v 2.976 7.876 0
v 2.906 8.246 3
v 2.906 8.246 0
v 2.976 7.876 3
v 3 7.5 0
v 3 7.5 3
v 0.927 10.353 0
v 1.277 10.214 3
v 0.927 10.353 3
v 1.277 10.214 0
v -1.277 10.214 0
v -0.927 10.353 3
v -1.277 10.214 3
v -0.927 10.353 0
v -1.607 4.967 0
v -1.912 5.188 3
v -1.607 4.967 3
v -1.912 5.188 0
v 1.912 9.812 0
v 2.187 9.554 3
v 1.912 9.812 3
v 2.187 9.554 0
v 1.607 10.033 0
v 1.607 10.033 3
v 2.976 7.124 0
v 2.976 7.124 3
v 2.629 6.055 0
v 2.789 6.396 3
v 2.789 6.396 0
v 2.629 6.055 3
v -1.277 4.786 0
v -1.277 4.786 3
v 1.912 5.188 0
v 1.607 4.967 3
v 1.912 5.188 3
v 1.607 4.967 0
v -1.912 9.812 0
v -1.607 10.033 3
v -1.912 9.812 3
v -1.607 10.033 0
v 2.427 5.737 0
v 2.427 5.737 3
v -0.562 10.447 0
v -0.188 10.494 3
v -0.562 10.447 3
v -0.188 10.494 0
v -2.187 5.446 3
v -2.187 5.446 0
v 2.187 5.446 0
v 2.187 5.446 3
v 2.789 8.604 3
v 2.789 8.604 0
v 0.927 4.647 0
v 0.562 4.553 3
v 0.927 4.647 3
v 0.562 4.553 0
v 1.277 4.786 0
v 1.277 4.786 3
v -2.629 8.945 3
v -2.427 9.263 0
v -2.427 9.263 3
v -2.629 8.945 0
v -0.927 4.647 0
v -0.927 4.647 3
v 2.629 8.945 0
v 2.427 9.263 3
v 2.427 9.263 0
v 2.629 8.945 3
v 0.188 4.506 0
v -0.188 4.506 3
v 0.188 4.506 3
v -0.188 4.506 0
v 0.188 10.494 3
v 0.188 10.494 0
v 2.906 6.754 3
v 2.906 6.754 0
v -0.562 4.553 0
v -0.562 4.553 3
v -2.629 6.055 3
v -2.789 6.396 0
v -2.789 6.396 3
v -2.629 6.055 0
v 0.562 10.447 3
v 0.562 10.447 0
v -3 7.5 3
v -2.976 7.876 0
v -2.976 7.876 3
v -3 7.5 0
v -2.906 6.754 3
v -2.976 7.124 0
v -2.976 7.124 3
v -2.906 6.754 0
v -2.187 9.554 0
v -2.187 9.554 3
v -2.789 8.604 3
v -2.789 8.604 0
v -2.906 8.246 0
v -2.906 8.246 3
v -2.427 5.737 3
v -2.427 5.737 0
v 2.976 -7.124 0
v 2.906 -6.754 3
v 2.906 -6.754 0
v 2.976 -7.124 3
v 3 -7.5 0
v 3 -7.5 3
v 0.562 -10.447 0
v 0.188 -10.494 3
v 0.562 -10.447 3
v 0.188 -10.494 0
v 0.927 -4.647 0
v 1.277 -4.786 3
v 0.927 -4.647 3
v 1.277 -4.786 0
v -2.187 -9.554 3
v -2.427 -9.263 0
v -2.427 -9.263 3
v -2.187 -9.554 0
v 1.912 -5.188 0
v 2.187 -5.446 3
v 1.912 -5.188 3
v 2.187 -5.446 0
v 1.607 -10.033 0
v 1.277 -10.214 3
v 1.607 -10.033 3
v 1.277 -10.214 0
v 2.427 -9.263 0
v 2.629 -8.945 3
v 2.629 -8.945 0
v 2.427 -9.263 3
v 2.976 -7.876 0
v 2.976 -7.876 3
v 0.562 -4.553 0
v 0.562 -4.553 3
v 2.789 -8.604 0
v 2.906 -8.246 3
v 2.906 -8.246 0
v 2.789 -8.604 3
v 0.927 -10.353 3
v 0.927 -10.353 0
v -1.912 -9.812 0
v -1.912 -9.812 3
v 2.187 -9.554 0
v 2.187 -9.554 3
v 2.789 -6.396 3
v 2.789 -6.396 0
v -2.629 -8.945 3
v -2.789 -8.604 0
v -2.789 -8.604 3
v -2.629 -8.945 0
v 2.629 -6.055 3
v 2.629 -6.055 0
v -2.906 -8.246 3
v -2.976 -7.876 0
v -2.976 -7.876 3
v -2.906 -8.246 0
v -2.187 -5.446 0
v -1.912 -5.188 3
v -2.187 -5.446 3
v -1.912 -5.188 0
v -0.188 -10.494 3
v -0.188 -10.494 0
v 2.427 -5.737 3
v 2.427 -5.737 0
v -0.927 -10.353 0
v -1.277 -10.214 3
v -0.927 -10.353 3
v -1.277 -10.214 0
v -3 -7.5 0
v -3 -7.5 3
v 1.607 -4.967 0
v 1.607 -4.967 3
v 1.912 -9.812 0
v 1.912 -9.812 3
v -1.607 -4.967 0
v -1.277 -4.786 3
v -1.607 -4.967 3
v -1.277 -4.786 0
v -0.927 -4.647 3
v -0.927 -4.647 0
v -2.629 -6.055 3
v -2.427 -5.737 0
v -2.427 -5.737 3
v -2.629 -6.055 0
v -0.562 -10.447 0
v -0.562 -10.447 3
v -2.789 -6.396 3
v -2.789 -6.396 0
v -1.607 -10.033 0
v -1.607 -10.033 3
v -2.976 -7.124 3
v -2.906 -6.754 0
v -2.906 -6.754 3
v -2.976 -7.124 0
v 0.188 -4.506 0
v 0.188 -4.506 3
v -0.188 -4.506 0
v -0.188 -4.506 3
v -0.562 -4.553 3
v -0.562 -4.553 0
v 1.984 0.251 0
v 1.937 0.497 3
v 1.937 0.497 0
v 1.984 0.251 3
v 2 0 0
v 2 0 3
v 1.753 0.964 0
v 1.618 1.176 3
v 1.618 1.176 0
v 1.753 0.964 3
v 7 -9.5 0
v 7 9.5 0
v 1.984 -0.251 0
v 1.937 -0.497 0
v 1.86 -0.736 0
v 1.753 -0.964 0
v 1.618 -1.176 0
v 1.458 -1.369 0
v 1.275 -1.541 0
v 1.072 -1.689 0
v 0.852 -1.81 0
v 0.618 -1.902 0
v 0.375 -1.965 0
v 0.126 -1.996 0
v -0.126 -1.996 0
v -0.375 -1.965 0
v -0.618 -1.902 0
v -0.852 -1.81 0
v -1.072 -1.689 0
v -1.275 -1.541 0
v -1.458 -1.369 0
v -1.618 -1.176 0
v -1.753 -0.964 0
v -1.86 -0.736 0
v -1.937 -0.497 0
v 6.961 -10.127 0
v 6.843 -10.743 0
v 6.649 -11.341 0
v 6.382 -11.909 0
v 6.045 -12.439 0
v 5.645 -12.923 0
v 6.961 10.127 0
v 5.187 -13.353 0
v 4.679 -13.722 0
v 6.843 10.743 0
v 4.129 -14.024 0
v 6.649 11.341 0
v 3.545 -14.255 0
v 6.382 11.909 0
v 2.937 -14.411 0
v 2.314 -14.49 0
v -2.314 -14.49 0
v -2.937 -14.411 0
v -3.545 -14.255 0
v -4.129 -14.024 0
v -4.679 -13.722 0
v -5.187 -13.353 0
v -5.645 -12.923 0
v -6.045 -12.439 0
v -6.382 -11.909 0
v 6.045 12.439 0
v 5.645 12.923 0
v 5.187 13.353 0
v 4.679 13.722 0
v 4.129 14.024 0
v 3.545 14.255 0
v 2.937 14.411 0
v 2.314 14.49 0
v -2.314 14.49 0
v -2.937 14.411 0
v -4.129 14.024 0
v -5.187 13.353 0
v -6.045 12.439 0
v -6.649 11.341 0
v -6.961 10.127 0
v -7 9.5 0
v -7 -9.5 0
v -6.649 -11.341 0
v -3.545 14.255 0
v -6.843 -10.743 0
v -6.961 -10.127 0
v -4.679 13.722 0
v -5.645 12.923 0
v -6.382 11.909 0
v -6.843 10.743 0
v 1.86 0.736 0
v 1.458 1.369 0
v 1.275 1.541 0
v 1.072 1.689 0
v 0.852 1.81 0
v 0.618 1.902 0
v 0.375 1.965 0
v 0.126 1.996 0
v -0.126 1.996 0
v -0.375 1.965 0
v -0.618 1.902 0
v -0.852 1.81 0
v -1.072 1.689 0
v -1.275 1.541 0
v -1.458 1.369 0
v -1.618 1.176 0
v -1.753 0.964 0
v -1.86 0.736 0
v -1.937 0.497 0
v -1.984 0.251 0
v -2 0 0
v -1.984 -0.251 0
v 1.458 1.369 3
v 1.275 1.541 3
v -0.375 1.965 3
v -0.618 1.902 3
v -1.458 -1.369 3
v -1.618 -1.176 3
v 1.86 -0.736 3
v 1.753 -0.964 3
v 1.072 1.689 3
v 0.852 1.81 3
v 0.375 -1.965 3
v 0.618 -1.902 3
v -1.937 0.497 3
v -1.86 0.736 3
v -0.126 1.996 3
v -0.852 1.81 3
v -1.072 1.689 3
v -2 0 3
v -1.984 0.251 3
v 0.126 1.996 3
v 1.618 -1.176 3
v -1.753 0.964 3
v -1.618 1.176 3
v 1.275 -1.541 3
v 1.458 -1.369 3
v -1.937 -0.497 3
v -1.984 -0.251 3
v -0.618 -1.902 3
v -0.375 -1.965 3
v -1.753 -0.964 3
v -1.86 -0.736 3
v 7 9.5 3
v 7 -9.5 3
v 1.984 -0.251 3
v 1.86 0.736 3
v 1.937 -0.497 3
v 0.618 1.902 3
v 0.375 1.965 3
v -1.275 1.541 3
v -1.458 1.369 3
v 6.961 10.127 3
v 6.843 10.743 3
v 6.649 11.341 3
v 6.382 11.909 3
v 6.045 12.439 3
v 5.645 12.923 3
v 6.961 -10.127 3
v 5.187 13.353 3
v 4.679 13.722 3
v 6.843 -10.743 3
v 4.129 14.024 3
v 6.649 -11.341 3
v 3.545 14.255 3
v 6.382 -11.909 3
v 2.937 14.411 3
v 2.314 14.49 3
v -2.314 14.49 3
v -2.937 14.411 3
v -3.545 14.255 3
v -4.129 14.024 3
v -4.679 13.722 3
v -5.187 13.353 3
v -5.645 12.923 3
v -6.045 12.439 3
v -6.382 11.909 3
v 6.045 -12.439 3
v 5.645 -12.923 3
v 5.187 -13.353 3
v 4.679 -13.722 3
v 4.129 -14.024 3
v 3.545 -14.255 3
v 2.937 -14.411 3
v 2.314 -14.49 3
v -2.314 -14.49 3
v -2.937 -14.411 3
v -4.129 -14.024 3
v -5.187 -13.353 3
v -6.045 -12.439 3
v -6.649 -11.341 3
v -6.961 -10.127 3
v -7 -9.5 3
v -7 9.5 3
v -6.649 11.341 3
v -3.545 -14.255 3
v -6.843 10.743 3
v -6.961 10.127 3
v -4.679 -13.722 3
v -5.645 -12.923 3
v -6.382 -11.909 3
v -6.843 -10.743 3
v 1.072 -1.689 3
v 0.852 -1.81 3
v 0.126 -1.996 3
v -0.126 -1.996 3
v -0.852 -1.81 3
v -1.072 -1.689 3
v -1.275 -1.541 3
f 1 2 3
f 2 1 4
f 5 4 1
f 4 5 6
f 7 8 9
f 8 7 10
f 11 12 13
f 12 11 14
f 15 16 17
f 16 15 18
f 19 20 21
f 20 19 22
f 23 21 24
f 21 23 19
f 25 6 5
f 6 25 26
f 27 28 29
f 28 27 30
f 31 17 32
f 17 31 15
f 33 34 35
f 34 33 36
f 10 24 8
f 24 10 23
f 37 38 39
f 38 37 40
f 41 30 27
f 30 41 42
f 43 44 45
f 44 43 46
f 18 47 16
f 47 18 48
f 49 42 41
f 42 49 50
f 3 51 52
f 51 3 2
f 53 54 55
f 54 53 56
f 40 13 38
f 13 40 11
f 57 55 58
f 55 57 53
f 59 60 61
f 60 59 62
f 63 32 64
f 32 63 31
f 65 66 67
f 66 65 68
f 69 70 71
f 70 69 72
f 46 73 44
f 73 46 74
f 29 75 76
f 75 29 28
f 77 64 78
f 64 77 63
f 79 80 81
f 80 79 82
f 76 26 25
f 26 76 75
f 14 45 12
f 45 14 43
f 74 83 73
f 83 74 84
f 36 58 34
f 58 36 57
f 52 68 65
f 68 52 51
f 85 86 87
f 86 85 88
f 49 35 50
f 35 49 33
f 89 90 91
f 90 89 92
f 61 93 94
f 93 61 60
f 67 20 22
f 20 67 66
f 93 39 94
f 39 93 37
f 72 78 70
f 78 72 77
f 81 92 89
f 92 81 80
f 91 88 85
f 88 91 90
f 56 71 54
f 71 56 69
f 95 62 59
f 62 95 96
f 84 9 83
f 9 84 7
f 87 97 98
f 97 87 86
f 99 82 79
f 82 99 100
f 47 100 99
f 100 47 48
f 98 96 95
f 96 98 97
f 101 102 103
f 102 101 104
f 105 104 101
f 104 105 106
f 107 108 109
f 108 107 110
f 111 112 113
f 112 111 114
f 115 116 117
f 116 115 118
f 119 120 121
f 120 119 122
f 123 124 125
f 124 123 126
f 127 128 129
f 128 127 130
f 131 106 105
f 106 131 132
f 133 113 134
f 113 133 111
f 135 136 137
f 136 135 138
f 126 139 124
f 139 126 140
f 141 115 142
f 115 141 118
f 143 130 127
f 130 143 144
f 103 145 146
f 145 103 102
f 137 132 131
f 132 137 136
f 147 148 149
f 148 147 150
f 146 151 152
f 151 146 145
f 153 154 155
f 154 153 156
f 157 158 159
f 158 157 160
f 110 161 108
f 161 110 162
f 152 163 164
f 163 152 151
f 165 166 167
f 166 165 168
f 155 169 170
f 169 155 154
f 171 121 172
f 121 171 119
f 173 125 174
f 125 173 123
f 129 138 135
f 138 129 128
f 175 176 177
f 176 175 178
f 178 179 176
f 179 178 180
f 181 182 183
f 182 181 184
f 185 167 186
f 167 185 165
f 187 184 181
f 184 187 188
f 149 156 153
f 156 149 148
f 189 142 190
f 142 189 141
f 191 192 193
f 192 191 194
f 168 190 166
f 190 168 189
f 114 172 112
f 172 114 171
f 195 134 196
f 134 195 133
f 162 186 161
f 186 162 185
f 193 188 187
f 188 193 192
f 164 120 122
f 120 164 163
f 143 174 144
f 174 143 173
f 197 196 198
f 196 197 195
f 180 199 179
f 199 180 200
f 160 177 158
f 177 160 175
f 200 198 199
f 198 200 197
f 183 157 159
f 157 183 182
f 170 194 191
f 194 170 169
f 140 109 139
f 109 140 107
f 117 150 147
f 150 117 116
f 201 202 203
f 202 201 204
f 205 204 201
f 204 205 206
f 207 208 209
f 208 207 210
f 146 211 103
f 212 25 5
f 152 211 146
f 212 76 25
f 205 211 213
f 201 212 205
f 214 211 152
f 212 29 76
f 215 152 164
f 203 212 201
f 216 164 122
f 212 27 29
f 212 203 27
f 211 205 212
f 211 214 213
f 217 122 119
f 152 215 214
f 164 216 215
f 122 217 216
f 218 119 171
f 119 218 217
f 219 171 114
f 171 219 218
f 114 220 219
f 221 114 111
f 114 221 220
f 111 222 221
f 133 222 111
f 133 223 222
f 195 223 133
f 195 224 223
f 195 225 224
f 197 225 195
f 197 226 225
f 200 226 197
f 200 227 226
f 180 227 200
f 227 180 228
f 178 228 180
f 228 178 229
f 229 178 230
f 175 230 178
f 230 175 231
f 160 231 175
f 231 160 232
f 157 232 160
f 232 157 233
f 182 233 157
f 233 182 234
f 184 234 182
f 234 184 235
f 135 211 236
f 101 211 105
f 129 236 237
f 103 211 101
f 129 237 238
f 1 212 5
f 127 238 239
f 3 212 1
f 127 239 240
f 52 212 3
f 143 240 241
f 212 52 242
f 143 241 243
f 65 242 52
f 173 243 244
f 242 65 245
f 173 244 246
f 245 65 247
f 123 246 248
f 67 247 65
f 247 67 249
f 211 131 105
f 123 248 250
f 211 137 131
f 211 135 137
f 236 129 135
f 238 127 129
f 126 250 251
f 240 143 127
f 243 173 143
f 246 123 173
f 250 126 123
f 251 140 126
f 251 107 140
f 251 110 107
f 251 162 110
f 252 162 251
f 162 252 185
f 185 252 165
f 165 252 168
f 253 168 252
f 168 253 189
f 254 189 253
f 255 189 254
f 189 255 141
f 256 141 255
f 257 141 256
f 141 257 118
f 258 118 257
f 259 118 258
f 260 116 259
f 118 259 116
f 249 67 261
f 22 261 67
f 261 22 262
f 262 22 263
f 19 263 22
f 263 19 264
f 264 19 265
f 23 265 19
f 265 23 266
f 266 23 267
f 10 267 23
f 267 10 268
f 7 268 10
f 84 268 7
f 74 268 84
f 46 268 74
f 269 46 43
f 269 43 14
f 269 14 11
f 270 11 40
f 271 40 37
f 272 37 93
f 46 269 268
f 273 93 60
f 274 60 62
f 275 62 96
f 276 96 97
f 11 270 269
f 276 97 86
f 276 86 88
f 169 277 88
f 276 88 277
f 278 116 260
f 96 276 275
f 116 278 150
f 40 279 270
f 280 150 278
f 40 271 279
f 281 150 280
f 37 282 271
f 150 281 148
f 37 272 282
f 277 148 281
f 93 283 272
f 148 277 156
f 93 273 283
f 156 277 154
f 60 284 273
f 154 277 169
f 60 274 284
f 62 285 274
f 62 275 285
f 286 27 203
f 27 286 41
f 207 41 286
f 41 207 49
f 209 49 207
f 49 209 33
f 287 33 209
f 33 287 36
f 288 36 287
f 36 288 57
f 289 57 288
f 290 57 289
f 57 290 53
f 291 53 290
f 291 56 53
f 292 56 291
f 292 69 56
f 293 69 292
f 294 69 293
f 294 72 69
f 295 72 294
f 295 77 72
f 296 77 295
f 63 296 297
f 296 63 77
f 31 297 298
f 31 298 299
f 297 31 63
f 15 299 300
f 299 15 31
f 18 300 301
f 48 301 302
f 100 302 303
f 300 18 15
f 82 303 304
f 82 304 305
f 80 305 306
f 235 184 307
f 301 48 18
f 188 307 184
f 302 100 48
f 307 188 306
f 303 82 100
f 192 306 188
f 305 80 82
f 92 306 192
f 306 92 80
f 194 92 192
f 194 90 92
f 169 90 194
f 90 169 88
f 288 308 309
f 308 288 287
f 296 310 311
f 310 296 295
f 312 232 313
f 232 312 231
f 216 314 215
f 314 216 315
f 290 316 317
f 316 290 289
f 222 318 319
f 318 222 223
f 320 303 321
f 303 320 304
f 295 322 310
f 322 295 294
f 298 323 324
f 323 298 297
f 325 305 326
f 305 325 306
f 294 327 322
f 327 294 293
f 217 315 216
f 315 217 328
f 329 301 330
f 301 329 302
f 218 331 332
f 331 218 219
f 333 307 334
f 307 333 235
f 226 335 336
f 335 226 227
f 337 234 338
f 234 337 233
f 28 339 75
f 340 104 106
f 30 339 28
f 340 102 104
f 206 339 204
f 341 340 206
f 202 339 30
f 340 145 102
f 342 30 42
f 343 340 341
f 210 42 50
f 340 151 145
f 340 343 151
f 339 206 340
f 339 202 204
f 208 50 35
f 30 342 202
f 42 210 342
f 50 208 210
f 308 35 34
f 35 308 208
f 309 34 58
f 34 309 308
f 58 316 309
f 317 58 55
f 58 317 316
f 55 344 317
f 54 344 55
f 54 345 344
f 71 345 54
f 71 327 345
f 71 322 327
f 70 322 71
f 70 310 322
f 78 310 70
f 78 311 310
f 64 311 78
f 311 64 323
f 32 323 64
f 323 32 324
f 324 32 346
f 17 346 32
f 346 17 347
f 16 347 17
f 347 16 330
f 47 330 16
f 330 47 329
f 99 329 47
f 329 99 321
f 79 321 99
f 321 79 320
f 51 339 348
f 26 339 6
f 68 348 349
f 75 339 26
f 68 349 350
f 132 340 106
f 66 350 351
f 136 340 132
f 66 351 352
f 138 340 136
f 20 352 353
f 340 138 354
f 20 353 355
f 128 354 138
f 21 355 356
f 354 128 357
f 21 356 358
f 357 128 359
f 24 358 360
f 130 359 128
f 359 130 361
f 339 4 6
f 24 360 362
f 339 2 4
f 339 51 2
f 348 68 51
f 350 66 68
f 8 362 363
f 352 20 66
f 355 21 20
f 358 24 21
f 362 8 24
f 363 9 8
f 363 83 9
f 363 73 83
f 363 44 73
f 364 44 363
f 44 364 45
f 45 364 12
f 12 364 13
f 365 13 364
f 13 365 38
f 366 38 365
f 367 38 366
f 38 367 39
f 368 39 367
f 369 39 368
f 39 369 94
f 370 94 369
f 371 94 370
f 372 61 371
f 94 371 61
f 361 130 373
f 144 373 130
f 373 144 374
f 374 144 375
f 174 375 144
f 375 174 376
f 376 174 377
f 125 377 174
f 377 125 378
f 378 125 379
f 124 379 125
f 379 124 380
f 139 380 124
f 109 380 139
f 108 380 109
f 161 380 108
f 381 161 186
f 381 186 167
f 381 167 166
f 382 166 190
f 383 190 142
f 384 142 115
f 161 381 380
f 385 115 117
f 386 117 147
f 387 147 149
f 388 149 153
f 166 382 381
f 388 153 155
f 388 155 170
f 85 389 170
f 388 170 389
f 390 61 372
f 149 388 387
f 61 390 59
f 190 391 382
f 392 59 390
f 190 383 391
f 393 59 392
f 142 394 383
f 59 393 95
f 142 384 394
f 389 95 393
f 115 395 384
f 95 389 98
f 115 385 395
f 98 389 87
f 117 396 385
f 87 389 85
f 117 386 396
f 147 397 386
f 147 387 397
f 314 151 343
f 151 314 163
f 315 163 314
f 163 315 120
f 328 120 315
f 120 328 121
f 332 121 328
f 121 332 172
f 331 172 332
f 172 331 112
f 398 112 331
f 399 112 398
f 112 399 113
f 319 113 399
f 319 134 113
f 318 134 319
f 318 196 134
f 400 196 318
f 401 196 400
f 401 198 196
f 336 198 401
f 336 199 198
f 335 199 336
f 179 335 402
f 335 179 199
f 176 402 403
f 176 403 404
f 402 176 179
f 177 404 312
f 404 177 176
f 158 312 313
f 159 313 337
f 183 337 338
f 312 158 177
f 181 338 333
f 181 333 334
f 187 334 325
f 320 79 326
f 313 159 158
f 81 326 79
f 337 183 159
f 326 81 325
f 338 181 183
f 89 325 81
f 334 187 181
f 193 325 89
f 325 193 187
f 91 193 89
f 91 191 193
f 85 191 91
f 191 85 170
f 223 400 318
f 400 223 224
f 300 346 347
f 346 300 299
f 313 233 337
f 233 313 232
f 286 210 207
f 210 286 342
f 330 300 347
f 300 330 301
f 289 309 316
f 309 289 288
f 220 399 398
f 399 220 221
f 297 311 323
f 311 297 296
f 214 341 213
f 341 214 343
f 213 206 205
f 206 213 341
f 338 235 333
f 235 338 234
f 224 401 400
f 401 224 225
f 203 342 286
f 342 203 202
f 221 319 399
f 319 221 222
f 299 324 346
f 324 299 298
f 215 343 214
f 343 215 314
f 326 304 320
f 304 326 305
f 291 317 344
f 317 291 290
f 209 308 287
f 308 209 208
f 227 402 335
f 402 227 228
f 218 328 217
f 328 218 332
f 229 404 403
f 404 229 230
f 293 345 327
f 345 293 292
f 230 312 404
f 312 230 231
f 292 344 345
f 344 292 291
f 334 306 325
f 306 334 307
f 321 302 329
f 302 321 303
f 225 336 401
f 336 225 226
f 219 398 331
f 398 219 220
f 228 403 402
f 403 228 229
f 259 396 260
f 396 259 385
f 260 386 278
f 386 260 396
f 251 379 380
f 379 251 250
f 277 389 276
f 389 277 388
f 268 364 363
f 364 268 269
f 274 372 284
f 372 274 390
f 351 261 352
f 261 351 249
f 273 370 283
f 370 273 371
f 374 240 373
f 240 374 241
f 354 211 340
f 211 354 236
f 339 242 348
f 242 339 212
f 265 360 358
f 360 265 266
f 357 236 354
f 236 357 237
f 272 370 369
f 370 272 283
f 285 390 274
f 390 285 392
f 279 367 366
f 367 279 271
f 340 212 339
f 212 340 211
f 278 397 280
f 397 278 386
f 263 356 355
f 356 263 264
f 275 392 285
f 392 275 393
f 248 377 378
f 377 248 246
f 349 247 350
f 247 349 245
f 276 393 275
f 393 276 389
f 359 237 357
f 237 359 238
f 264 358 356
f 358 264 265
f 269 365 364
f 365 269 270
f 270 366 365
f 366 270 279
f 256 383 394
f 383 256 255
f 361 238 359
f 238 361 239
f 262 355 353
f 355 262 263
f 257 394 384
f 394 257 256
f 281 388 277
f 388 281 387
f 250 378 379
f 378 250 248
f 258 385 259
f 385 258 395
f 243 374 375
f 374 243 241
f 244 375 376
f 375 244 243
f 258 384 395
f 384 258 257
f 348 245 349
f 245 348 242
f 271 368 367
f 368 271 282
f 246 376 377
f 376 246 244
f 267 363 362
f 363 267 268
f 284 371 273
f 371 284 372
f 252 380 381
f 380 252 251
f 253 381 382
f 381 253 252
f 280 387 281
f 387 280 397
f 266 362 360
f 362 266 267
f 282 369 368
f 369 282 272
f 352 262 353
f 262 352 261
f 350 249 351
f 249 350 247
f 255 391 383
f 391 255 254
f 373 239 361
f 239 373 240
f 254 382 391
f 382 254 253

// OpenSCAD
$fn = 50;


difference() {
	union() {
		hull() {
			translate(v = [-2.0000000000, 9.5000000000, 0]) {
				cylinder(h = 3, r = 5);
			}
			translate(v = [2.0000000000, 9.5000000000, 0]) {
				cylinder(h = 3, r = 5);
			}
			translate(v = [-2.0000000000, -9.5000000000, 0]) {
				cylinder(h = 3, r = 5);
			}
			translate(v = [2.0000000000, -9.5000000000, 0]) {
				cylinder(h = 3, r = 5);
			}
		}
	}
	union() {
		#translate(v = [0.0000000000, 7.5000000000, 0]) {
			cylinder(h = 3, r = 3.0000000000);
		}
		#translate(v = [0.0000000000, -7.5000000000, 0]) {
			cylinder(h = 3, r = 3.0000000000);
		}
		#translate(v = [0.0000000000, -7.5000000000, -100.0000000000]) {
			cylinder(h = 200, r = 3.0000000000);
		}
		#translate(v = [0.0000000000, -7.5000000000, -100.0000000000]) {
			cylinder(h = 200, r = 3.0000000000);
		}
		#translate(v = [0.0000000000, 7.5000000000, -100.0000000000]) {
			cylinder(h = 200, r = 3.0000000000);
		}
		#translate(v = [0.0000000000, 7.5000000000, -100.0000000000]) {
			cylinder(h = 200, r = 3.0000000000);
		}
		#translate(v = [0.0000000000, 7.5000000000, 0]) {
			cylinder(h = 3, r = 1.5000000000);
		}
		#translate(v = [0.0000000000, -7.5000000000, 0]) {
			cylinder(h = 3, r = 1.5000000000);
		}
		#translate(v = [0.0000000000, 7.5000000000, 0]) {
			cylinder(h = 3, r = 1.5000000000);
		}
		#translate(v = [0.0000000000, -7.5000000000, 0]) {
			cylinder(h = 3, r = 1.5000000000);
		}
		#translate(v = [0.0000000000, 7.5000000000, 0]) {
			cylinder(h = 3, r = 1.5000000000);
		}
		#translate(v = [0.0000000000, -7.5000000000, 0]) {
			cylinder(h = 3, r = 1.5000000000);
		}
		#cylinder(h = 3, r = 2.0000000000);
	}
}
